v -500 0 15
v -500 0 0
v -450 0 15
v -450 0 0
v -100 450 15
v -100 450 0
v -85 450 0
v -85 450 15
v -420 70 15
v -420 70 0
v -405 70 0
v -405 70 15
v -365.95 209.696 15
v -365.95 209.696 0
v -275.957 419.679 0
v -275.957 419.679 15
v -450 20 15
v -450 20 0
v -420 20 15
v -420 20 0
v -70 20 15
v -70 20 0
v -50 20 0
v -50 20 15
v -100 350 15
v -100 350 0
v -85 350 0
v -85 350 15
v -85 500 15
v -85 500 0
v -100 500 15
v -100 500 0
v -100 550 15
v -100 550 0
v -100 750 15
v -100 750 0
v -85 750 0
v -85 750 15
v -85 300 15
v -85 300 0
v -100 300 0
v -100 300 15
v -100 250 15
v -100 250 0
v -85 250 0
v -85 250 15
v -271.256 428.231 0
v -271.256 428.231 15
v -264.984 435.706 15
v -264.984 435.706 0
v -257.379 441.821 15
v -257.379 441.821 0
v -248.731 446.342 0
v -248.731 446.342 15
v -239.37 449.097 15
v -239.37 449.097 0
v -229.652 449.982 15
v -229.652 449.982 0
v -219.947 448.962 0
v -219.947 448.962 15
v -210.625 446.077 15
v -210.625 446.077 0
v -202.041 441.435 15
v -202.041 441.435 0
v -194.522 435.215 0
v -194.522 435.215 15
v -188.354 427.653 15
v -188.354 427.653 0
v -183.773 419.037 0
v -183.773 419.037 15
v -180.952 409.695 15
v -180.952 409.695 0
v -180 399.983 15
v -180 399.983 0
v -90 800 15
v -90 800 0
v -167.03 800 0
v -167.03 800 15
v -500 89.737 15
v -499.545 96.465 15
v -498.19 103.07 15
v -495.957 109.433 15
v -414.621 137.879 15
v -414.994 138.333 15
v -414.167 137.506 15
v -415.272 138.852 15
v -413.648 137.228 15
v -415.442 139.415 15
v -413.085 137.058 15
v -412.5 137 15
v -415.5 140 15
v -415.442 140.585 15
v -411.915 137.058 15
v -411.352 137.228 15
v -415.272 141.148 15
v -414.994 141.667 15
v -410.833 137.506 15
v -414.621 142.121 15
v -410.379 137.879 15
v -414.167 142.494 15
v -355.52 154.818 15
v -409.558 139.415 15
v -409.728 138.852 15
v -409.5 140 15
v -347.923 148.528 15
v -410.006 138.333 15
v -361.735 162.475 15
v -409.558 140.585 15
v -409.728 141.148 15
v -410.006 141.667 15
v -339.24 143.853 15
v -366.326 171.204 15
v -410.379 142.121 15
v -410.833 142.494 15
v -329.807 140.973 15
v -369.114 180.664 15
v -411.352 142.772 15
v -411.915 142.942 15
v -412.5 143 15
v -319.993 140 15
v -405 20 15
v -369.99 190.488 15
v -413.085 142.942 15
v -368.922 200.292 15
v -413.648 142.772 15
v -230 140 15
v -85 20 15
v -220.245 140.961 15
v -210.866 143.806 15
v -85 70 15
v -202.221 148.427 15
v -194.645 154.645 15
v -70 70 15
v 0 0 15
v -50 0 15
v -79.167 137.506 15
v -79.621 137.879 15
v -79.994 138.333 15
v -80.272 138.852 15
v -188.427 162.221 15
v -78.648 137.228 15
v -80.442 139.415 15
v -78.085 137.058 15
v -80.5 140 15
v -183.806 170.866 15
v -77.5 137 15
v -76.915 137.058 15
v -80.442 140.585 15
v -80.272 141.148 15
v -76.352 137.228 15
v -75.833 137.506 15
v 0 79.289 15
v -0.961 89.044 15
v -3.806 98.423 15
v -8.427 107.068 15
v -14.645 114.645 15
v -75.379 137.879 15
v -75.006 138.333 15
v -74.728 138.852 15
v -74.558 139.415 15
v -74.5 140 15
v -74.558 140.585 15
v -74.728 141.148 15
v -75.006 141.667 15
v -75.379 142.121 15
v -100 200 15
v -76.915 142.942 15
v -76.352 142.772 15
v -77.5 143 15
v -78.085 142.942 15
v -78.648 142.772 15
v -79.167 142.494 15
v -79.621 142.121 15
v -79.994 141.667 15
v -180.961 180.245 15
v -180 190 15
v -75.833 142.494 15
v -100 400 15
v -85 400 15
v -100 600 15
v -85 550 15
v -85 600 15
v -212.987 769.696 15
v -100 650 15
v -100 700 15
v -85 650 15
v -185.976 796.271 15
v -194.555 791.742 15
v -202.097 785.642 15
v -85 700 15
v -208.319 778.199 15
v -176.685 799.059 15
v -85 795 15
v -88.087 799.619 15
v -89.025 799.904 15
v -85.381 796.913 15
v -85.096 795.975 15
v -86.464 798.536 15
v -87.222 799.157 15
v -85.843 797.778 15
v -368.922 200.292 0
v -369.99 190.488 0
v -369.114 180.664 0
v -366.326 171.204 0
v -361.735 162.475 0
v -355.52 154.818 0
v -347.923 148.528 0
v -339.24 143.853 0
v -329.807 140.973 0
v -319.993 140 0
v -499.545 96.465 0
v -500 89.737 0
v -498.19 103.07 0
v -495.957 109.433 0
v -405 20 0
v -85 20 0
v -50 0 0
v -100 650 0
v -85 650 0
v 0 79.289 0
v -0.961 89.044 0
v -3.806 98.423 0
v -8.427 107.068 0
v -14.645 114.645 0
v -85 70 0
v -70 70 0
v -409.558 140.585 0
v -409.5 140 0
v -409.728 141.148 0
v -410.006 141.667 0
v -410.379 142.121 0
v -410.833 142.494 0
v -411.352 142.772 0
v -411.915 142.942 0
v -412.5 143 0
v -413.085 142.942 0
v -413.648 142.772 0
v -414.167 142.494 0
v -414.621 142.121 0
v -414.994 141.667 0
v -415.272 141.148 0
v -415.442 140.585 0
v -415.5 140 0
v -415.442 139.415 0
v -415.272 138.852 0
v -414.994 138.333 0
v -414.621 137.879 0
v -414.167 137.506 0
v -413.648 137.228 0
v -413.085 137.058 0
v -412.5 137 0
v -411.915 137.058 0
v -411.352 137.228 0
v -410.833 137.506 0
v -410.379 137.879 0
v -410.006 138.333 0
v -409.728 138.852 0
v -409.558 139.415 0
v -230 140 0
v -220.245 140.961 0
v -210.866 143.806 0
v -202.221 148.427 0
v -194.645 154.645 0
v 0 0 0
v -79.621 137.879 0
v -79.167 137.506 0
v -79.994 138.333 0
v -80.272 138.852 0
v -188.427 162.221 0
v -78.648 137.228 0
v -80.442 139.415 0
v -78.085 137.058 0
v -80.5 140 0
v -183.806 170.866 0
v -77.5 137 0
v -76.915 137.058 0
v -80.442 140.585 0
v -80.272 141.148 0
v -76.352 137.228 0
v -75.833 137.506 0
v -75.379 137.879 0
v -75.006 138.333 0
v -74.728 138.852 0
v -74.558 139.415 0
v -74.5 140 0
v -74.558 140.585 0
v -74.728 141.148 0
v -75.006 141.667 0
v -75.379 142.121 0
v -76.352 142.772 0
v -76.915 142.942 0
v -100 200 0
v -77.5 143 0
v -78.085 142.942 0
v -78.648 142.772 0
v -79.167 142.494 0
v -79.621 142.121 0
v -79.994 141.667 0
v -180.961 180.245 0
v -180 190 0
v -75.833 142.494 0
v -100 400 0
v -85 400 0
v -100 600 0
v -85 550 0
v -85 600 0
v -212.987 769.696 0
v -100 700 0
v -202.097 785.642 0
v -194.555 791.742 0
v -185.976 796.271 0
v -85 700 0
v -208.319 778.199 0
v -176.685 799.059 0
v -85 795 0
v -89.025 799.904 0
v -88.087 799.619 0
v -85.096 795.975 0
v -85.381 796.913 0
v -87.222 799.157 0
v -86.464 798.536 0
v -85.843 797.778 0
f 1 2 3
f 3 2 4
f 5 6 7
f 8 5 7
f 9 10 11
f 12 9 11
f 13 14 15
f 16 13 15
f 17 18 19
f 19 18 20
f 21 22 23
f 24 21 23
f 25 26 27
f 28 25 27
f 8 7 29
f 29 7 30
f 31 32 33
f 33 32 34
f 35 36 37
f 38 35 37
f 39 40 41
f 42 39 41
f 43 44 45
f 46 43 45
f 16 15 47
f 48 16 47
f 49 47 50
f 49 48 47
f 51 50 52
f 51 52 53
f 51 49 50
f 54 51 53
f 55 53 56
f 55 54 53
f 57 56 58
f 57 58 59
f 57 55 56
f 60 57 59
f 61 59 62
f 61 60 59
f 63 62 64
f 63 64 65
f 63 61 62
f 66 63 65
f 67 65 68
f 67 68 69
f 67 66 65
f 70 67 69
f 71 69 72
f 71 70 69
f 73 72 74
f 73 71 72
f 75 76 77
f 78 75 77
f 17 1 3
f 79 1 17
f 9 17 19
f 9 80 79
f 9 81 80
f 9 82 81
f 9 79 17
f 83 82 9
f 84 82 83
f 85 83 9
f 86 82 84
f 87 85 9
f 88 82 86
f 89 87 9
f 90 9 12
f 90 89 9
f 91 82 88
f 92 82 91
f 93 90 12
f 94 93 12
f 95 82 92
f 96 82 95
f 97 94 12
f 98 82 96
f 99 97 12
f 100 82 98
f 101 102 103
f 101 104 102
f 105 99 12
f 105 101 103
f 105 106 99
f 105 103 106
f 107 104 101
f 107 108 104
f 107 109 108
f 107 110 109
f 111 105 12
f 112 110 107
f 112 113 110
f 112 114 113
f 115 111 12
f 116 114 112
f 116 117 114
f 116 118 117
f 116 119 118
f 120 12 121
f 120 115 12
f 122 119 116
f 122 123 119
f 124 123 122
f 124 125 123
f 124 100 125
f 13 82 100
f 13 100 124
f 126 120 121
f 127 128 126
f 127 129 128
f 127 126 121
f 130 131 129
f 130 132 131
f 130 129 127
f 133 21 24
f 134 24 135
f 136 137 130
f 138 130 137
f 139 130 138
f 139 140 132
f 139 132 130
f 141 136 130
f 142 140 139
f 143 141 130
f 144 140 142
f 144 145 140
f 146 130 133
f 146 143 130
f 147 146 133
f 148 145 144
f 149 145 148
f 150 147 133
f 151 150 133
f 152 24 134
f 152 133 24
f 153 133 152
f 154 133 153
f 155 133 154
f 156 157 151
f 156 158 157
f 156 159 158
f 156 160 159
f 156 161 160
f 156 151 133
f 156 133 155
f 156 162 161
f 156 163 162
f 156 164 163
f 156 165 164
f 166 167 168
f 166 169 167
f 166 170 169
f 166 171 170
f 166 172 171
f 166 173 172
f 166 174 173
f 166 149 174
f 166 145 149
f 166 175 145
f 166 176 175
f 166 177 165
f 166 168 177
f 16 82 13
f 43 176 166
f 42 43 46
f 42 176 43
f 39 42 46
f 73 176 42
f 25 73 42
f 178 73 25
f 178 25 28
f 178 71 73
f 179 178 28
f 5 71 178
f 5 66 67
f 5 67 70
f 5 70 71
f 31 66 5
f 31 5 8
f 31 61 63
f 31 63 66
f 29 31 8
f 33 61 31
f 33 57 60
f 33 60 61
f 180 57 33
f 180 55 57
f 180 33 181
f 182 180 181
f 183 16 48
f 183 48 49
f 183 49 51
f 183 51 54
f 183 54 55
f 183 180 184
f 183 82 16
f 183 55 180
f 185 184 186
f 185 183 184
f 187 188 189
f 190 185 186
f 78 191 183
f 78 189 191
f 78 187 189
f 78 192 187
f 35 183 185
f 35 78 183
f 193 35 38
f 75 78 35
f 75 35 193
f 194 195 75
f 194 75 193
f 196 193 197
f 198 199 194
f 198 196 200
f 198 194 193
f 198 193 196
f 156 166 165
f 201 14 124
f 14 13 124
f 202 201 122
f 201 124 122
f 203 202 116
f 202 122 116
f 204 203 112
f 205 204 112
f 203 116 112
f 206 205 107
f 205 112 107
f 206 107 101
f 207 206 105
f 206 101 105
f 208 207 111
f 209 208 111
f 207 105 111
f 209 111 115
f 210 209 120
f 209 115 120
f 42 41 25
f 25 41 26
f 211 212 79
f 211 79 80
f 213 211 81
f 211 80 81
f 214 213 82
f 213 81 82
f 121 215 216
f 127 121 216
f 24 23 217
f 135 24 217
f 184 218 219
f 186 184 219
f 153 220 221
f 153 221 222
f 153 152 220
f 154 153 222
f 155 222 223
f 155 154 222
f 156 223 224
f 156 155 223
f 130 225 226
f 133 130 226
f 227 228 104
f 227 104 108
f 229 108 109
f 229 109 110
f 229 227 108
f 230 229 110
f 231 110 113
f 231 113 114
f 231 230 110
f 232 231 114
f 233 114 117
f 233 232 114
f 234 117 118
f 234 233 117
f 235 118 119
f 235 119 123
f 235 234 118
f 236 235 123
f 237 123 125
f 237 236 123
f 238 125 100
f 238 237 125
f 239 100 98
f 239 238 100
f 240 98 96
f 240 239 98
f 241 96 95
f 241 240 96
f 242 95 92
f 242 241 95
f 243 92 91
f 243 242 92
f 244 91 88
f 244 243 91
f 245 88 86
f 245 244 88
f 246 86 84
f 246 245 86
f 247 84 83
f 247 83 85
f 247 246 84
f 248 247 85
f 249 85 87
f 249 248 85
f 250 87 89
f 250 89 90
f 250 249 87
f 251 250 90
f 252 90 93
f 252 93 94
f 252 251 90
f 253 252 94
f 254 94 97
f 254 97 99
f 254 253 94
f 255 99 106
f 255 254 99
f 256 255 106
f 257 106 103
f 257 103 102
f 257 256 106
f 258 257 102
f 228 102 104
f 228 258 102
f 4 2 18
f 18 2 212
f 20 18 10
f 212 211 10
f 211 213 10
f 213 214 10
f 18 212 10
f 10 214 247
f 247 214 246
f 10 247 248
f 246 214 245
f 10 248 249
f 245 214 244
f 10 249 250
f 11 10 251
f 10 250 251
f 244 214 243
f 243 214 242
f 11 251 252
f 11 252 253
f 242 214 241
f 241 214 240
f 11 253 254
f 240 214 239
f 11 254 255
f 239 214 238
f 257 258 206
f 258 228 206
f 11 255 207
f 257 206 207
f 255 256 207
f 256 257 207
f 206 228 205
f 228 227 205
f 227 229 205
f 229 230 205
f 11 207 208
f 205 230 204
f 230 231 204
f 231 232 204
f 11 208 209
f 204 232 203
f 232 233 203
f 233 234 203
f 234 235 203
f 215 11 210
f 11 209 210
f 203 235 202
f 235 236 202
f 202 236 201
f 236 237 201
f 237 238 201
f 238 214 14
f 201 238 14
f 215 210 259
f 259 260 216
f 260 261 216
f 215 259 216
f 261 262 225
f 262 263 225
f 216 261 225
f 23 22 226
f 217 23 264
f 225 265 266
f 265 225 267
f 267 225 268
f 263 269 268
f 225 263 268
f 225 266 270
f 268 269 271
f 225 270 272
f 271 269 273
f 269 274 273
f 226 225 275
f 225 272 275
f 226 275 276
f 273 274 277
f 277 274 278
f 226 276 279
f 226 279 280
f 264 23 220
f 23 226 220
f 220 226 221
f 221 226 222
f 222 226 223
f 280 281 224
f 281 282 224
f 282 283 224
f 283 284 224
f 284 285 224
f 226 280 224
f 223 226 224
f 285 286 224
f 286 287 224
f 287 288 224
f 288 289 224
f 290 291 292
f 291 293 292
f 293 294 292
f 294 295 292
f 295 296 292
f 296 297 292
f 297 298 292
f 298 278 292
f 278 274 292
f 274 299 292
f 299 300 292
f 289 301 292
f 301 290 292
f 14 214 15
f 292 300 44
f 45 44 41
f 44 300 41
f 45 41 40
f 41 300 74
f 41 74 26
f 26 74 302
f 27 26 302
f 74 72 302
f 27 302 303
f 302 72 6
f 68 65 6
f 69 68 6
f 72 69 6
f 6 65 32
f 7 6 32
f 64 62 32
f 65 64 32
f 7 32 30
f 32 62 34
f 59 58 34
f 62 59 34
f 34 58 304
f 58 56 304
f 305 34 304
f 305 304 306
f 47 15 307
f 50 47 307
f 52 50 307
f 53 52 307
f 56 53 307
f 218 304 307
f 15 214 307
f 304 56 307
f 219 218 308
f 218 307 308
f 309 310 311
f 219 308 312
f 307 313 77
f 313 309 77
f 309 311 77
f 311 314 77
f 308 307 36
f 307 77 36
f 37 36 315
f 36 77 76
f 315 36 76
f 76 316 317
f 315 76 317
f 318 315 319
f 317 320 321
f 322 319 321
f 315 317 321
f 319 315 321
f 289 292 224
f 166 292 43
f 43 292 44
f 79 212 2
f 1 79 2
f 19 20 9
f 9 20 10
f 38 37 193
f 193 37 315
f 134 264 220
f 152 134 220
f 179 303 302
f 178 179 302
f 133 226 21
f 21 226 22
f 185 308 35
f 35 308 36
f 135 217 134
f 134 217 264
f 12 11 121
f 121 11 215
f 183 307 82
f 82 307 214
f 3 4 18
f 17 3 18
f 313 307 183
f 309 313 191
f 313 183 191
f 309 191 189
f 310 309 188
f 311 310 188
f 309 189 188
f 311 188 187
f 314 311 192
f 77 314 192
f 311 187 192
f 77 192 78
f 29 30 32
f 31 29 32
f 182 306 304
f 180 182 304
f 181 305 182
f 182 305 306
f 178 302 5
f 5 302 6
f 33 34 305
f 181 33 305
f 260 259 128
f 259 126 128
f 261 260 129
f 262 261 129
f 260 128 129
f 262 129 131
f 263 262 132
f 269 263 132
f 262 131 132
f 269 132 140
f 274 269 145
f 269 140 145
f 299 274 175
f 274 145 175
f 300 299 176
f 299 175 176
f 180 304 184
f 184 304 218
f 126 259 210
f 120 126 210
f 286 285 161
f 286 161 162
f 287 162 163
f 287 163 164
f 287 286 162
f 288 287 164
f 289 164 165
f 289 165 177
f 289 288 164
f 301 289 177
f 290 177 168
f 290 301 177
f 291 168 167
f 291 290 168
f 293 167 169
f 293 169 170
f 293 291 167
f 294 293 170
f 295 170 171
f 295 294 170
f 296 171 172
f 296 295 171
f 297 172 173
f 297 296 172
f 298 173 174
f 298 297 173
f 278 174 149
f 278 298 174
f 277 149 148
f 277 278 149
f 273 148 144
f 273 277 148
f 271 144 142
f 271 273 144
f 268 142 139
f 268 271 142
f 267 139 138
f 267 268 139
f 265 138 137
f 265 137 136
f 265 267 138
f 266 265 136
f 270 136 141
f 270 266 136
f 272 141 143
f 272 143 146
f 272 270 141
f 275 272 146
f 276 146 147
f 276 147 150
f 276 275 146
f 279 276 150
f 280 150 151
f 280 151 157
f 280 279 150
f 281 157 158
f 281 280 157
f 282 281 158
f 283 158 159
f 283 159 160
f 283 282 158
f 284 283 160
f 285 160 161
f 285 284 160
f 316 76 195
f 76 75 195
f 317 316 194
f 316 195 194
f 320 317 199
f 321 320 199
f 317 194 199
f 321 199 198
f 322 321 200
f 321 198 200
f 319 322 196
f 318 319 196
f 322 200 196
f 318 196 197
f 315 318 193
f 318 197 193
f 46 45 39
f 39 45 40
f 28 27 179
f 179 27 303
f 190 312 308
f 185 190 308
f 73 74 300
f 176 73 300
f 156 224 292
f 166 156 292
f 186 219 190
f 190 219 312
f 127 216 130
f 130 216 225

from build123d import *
from OCP.BRepFilletAPI import BRepFilletAPI_MakeFillet

# Parameters (mm, degrees)
ESQUISSE1_R        = 3
BOSS_EXTRU_1_DEPTH = 15
CONG_1_R1          = 50
CONG_1_R2          = 5


with BuildPart() as part:
    # Esquisse1 → Boss.-Extru.1 (new body)
    with BuildSketch(Plane.XY):
        Polygon((-450, 0), (-450, 20), (-420, 20), (-420, 70), (-405, 70), (-405, 20), (-85, 20), (-85, 70), (-70, 70), (-70, 20), (-50, 20), (-50, 0), (0, 0), (0, 100), (-100, 200), (-100, 250), (-85, 250), (-85, 300), (-100, 300), (-100, 350), (-85, 350), (-85, 400), (-100, 400), (-100, 450), (-85, 450), (-85, 500), (-100, 500), (-100, 550), (-85, 550), (-85, 600), (-100, 600), (-100, 650), (-85, 650), (-85, 700), (-100, 700), (-100, 750), (-85, 750), (-85, 800), (-100, 800), (-200, 800), (-500, 100), (-500, 0), align=None)
        with Locations((-412.5, 140)):
            Circle(ESQUISSE1_R, mode=Mode.SUBTRACT)
        with Locations((-77.5, 140)):
            Circle(ESQUISSE1_R, mode=Mode.SUBTRACT)
        Polygon((-180, 643.579383844), (-180, 140), (-395.819735933, 140), align=None, mode=Mode.SUBTRACT)
    extrude(amount=BOSS_EXTRU_1_DEPTH)

    # Congé1: one fillet with a radius per group of edges: ONE call of the kernel's fillet builder (fillet() takes one radius for all edges)
    cong_1_edges_1 = [part.edges().sort_by_distance(p)[0] for p in [
        (-200, 800, 7.5),
        (-180, 643.579383844, 7.5),
        (-395.819735933, 140, 7.5),
        (-180, 140, 7.5),
        (0, 100, 7.5),
        (-500, 100, 7.5),
    ]]
    cong_1_edges_2 = [part.edges().sort_by_distance(p)[0] for p in [
        (-85, 800, 7.5),
    ]]
    cong_1 = BRepFilletAPI_MakeFillet(part.part.solid().wrapped)
    for e in cong_1_edges_1:
        cong_1.Add(CONG_1_R1, e.wrapped)
    for e in cong_1_edges_2:
        cong_1.Add(CONG_1_R2, e.wrapped)
    add(Compound.cast(cong_1.Shape()), mode=Mode.REPLACE)


solid = part.part
